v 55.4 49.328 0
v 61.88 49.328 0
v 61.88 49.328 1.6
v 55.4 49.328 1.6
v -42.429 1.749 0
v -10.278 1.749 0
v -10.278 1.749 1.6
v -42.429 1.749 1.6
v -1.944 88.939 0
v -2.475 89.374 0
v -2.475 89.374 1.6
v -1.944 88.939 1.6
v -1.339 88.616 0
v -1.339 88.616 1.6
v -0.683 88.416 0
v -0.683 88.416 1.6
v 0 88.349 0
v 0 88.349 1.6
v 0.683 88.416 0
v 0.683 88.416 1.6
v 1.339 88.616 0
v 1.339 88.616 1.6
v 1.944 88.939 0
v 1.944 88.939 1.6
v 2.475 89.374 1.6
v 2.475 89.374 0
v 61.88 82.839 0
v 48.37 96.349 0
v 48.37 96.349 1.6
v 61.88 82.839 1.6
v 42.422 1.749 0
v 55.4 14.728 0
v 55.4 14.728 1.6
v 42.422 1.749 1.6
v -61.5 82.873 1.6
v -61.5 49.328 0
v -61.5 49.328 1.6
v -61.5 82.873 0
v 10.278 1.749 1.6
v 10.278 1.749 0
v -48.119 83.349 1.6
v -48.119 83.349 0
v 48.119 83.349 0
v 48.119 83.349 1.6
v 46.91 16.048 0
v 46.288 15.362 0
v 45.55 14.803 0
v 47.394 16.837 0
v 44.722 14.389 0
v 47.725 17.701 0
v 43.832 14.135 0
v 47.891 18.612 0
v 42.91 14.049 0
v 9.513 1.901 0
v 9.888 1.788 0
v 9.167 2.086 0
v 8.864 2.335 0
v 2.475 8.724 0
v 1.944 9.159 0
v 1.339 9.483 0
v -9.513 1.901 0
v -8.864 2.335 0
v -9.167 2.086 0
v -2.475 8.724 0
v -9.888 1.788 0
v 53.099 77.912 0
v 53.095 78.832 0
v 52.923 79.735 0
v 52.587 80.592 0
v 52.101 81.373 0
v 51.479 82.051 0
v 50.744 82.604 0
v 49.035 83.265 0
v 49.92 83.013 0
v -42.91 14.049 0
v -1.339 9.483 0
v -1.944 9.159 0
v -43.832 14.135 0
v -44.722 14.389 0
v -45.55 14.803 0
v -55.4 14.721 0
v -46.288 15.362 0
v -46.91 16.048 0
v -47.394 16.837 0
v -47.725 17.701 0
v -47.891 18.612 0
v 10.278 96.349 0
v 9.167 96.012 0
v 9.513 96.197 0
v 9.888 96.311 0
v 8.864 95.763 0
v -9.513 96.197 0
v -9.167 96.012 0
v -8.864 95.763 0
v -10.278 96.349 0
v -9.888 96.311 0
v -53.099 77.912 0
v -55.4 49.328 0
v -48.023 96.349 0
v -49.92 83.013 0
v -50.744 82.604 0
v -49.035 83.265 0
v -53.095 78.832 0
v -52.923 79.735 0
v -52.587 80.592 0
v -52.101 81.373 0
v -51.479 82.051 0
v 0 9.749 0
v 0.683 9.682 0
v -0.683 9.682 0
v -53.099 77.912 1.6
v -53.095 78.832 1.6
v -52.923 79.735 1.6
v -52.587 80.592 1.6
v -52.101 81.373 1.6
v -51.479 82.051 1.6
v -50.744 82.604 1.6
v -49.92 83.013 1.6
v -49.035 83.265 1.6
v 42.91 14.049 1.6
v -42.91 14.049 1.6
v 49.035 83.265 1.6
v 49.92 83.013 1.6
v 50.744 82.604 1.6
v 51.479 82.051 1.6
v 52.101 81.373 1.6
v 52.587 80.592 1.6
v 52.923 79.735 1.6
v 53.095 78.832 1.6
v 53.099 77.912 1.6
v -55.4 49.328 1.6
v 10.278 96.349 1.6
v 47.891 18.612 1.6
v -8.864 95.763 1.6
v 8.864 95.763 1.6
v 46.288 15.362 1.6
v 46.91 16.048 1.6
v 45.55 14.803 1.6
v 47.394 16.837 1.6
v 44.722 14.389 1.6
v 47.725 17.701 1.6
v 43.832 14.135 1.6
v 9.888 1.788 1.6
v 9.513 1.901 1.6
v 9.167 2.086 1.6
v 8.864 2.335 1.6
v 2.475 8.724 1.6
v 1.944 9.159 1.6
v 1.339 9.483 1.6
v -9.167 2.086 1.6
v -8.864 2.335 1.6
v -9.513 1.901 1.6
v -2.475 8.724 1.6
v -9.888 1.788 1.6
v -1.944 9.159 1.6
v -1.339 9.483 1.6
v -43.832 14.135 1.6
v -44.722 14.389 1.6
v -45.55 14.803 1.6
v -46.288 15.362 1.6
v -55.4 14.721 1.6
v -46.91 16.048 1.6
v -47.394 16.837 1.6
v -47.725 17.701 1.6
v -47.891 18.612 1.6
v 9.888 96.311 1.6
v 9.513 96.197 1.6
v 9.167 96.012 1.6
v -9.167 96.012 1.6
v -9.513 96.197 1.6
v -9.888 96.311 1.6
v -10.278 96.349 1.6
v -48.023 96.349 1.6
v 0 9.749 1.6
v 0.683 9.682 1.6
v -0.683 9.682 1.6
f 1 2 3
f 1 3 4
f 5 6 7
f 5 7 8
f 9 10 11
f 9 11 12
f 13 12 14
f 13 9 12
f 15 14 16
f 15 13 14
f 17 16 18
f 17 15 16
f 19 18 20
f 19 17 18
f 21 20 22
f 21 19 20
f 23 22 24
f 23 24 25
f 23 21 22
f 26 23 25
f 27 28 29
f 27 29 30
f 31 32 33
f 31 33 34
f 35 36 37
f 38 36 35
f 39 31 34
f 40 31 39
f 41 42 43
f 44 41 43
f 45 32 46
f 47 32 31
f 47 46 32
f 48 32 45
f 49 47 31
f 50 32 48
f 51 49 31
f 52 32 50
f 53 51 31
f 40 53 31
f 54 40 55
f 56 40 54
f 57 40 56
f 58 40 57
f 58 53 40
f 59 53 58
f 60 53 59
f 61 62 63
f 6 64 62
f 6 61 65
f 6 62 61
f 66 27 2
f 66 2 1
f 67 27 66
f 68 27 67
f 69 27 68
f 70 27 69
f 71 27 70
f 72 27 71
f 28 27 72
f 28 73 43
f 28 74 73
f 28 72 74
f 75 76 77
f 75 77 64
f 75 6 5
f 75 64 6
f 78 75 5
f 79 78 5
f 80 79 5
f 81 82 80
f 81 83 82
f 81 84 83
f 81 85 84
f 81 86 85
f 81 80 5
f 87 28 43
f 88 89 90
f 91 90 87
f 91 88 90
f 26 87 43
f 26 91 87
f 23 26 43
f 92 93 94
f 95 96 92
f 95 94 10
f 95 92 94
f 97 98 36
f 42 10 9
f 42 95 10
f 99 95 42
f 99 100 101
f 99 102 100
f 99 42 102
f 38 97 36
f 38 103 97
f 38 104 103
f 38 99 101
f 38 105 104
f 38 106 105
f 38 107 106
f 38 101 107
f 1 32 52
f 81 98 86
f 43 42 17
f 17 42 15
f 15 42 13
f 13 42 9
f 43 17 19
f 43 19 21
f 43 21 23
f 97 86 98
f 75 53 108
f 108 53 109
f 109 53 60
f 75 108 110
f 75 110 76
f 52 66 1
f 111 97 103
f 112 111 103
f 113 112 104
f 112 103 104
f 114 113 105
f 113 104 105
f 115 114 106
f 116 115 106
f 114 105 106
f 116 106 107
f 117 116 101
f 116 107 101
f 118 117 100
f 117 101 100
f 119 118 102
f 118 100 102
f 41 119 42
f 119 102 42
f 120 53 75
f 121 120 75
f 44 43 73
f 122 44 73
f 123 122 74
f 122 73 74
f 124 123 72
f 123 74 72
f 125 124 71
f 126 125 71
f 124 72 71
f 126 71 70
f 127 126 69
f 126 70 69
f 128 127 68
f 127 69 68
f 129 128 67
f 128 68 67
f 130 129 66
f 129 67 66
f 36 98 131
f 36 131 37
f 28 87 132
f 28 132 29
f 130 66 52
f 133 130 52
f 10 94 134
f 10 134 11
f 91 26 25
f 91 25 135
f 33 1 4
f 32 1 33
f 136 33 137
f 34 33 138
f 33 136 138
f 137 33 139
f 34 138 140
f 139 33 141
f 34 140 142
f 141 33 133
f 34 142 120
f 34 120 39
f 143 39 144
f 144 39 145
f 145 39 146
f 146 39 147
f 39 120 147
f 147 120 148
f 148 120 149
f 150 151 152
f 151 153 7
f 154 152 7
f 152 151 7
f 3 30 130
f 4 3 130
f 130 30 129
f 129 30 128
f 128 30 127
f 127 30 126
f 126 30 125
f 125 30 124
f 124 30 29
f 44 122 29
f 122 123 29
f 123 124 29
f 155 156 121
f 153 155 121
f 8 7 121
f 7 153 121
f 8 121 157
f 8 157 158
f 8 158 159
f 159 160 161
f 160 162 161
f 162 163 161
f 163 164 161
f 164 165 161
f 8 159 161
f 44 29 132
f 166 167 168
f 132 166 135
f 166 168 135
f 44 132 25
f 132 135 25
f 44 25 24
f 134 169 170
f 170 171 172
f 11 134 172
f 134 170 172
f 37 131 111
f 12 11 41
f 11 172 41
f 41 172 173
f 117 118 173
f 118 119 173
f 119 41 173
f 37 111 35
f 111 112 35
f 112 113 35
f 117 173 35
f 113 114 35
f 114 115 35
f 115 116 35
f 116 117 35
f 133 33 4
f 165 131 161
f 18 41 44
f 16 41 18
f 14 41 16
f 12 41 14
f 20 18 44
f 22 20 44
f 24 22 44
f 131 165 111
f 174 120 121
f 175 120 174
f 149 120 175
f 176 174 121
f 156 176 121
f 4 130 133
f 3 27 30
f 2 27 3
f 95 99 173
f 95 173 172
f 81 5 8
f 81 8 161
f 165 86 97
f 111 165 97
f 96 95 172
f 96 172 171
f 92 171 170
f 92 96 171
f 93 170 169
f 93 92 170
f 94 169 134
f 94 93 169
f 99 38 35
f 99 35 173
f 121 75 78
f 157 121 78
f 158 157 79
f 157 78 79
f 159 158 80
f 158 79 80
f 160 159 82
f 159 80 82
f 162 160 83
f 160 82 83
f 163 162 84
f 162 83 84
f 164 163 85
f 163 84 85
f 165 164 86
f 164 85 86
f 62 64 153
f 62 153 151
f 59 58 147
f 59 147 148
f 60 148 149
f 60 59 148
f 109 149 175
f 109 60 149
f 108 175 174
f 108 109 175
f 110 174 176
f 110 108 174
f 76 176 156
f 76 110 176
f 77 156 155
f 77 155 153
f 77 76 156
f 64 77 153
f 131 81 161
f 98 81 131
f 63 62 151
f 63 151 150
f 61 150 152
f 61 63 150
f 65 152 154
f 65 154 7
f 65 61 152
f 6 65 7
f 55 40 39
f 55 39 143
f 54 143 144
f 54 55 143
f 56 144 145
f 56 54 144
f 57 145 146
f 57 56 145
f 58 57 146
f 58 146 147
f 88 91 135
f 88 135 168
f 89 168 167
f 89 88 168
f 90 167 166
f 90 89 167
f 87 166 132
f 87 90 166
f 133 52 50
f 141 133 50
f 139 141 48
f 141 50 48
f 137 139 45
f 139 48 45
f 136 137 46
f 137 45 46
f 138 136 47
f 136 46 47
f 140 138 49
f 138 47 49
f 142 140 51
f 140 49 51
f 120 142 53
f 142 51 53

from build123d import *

# Parameters (mm, degrees)
EXTRUSION1_DEPTH = 1.6


with BuildPart() as part:
    # Esquisse1 → Extrusion1 (new body)
    with BuildSketch(Plane.XY):
        with BuildLine():
            Line((-48.023369217, 96.349184509), (-10.278174593, 96.349184509))
            ThreePointArc((-10.278174593, 96.349184509), (-9.512807728, 96.196943574), (-8.863961031, 95.763398071))
            Line((-8.863961031, 95.763398071), (-2.474873734, 89.374310774))
            ThreePointArc((-2.474873734, 89.374310774), (0, 88.349184509), (2.474873734, 89.374310774))
            Line((2.474873734, 89.374310774), (8.863961031, 95.763398071))
            ThreePointArc((8.863961031, 95.763398071), (9.512807728, 96.196943574), (10.278174593, 96.349184509))
            Line((10.278174593, 96.349184509), (48.369947474, 96.349184509))
            Line((48.369947474, 96.349184509), (61.879867656, 82.839264327))
            Line((61.879867656, 82.839264327), (61.879867656, 49.32839662))
            Line((61.879867656, 49.32839662), (55.4, 49.32839662))
            Line((55.4, 49.32839662), (55.4, 14.727514678))
            Line((55.4, 14.727514678), (42.421669831, 1.749184509))
            Line((42.421669831, 1.749184509), (10.278174593, 1.749184509))
            ThreePointArc((10.278174593, 1.749184509), (9.512807728, 1.901425444), (8.863961031, 2.334970946))
            Line((8.863961031, 2.334970946), (2.474873734, 8.724058243))
            ThreePointArc((2.474873734, 8.724058243), (0, 9.749184509), (-2.474873734, 8.724058243))
            Line((-2.474873734, 8.724058243), (-8.863961031, 2.334970946))
            ThreePointArc((-8.863961031, 2.334970946), (-9.512807728, 1.901425444), (-10.278174593, 1.749184509))
            Line((-10.278174593, 1.749184509), (-42.428554593, 1.749184509))
            Line((-42.428554593, 1.749184509), (-55.4, 14.720629916))
            Line((-55.4, 14.720629916), (-55.4, 49.32839662))
            Line((-55.4, 49.32839662), (-61.5, 49.32839662))
            Line((-61.5, 49.32839662), (-61.5, 82.872553726))
            Line((-61.5, 82.872553726), (-48.023369217, 96.349184509))
        make_face()
        with BuildLine():
            Line((-48.118530535, 83.349184509), (48.118530535, 83.349184509))
            ThreePointArc((48.118530535, 83.349184509), (51.805481915, 81.726519186), (53.099358035, 77.911740318))
            Line((53.099358035, 77.911740318), (47.891299628, 18.611740318))
            ThreePointArc((47.891299628, 18.611740318), (46.287806806, 15.362233129), (42.910472129, 14.049184509))
            Line((42.910472129, 14.049184509), (-42.910472129, 14.049184509))
            ThreePointArc((-42.910472129, 14.049184509), (-46.287806806, 15.362233129), (-47.891299628, 18.611740318))
            Line((-47.891299628, 18.611740318), (-53.099358035, 77.911740318))
            ThreePointArc((-53.099358035, 77.911740318), (-51.805481915, 81.726519186), (-48.118530535, 83.349184509))
        make_face(mode=Mode.SUBTRACT)
    extrude(amount=EXTRUSION1_DEPTH)


solid = part.part
